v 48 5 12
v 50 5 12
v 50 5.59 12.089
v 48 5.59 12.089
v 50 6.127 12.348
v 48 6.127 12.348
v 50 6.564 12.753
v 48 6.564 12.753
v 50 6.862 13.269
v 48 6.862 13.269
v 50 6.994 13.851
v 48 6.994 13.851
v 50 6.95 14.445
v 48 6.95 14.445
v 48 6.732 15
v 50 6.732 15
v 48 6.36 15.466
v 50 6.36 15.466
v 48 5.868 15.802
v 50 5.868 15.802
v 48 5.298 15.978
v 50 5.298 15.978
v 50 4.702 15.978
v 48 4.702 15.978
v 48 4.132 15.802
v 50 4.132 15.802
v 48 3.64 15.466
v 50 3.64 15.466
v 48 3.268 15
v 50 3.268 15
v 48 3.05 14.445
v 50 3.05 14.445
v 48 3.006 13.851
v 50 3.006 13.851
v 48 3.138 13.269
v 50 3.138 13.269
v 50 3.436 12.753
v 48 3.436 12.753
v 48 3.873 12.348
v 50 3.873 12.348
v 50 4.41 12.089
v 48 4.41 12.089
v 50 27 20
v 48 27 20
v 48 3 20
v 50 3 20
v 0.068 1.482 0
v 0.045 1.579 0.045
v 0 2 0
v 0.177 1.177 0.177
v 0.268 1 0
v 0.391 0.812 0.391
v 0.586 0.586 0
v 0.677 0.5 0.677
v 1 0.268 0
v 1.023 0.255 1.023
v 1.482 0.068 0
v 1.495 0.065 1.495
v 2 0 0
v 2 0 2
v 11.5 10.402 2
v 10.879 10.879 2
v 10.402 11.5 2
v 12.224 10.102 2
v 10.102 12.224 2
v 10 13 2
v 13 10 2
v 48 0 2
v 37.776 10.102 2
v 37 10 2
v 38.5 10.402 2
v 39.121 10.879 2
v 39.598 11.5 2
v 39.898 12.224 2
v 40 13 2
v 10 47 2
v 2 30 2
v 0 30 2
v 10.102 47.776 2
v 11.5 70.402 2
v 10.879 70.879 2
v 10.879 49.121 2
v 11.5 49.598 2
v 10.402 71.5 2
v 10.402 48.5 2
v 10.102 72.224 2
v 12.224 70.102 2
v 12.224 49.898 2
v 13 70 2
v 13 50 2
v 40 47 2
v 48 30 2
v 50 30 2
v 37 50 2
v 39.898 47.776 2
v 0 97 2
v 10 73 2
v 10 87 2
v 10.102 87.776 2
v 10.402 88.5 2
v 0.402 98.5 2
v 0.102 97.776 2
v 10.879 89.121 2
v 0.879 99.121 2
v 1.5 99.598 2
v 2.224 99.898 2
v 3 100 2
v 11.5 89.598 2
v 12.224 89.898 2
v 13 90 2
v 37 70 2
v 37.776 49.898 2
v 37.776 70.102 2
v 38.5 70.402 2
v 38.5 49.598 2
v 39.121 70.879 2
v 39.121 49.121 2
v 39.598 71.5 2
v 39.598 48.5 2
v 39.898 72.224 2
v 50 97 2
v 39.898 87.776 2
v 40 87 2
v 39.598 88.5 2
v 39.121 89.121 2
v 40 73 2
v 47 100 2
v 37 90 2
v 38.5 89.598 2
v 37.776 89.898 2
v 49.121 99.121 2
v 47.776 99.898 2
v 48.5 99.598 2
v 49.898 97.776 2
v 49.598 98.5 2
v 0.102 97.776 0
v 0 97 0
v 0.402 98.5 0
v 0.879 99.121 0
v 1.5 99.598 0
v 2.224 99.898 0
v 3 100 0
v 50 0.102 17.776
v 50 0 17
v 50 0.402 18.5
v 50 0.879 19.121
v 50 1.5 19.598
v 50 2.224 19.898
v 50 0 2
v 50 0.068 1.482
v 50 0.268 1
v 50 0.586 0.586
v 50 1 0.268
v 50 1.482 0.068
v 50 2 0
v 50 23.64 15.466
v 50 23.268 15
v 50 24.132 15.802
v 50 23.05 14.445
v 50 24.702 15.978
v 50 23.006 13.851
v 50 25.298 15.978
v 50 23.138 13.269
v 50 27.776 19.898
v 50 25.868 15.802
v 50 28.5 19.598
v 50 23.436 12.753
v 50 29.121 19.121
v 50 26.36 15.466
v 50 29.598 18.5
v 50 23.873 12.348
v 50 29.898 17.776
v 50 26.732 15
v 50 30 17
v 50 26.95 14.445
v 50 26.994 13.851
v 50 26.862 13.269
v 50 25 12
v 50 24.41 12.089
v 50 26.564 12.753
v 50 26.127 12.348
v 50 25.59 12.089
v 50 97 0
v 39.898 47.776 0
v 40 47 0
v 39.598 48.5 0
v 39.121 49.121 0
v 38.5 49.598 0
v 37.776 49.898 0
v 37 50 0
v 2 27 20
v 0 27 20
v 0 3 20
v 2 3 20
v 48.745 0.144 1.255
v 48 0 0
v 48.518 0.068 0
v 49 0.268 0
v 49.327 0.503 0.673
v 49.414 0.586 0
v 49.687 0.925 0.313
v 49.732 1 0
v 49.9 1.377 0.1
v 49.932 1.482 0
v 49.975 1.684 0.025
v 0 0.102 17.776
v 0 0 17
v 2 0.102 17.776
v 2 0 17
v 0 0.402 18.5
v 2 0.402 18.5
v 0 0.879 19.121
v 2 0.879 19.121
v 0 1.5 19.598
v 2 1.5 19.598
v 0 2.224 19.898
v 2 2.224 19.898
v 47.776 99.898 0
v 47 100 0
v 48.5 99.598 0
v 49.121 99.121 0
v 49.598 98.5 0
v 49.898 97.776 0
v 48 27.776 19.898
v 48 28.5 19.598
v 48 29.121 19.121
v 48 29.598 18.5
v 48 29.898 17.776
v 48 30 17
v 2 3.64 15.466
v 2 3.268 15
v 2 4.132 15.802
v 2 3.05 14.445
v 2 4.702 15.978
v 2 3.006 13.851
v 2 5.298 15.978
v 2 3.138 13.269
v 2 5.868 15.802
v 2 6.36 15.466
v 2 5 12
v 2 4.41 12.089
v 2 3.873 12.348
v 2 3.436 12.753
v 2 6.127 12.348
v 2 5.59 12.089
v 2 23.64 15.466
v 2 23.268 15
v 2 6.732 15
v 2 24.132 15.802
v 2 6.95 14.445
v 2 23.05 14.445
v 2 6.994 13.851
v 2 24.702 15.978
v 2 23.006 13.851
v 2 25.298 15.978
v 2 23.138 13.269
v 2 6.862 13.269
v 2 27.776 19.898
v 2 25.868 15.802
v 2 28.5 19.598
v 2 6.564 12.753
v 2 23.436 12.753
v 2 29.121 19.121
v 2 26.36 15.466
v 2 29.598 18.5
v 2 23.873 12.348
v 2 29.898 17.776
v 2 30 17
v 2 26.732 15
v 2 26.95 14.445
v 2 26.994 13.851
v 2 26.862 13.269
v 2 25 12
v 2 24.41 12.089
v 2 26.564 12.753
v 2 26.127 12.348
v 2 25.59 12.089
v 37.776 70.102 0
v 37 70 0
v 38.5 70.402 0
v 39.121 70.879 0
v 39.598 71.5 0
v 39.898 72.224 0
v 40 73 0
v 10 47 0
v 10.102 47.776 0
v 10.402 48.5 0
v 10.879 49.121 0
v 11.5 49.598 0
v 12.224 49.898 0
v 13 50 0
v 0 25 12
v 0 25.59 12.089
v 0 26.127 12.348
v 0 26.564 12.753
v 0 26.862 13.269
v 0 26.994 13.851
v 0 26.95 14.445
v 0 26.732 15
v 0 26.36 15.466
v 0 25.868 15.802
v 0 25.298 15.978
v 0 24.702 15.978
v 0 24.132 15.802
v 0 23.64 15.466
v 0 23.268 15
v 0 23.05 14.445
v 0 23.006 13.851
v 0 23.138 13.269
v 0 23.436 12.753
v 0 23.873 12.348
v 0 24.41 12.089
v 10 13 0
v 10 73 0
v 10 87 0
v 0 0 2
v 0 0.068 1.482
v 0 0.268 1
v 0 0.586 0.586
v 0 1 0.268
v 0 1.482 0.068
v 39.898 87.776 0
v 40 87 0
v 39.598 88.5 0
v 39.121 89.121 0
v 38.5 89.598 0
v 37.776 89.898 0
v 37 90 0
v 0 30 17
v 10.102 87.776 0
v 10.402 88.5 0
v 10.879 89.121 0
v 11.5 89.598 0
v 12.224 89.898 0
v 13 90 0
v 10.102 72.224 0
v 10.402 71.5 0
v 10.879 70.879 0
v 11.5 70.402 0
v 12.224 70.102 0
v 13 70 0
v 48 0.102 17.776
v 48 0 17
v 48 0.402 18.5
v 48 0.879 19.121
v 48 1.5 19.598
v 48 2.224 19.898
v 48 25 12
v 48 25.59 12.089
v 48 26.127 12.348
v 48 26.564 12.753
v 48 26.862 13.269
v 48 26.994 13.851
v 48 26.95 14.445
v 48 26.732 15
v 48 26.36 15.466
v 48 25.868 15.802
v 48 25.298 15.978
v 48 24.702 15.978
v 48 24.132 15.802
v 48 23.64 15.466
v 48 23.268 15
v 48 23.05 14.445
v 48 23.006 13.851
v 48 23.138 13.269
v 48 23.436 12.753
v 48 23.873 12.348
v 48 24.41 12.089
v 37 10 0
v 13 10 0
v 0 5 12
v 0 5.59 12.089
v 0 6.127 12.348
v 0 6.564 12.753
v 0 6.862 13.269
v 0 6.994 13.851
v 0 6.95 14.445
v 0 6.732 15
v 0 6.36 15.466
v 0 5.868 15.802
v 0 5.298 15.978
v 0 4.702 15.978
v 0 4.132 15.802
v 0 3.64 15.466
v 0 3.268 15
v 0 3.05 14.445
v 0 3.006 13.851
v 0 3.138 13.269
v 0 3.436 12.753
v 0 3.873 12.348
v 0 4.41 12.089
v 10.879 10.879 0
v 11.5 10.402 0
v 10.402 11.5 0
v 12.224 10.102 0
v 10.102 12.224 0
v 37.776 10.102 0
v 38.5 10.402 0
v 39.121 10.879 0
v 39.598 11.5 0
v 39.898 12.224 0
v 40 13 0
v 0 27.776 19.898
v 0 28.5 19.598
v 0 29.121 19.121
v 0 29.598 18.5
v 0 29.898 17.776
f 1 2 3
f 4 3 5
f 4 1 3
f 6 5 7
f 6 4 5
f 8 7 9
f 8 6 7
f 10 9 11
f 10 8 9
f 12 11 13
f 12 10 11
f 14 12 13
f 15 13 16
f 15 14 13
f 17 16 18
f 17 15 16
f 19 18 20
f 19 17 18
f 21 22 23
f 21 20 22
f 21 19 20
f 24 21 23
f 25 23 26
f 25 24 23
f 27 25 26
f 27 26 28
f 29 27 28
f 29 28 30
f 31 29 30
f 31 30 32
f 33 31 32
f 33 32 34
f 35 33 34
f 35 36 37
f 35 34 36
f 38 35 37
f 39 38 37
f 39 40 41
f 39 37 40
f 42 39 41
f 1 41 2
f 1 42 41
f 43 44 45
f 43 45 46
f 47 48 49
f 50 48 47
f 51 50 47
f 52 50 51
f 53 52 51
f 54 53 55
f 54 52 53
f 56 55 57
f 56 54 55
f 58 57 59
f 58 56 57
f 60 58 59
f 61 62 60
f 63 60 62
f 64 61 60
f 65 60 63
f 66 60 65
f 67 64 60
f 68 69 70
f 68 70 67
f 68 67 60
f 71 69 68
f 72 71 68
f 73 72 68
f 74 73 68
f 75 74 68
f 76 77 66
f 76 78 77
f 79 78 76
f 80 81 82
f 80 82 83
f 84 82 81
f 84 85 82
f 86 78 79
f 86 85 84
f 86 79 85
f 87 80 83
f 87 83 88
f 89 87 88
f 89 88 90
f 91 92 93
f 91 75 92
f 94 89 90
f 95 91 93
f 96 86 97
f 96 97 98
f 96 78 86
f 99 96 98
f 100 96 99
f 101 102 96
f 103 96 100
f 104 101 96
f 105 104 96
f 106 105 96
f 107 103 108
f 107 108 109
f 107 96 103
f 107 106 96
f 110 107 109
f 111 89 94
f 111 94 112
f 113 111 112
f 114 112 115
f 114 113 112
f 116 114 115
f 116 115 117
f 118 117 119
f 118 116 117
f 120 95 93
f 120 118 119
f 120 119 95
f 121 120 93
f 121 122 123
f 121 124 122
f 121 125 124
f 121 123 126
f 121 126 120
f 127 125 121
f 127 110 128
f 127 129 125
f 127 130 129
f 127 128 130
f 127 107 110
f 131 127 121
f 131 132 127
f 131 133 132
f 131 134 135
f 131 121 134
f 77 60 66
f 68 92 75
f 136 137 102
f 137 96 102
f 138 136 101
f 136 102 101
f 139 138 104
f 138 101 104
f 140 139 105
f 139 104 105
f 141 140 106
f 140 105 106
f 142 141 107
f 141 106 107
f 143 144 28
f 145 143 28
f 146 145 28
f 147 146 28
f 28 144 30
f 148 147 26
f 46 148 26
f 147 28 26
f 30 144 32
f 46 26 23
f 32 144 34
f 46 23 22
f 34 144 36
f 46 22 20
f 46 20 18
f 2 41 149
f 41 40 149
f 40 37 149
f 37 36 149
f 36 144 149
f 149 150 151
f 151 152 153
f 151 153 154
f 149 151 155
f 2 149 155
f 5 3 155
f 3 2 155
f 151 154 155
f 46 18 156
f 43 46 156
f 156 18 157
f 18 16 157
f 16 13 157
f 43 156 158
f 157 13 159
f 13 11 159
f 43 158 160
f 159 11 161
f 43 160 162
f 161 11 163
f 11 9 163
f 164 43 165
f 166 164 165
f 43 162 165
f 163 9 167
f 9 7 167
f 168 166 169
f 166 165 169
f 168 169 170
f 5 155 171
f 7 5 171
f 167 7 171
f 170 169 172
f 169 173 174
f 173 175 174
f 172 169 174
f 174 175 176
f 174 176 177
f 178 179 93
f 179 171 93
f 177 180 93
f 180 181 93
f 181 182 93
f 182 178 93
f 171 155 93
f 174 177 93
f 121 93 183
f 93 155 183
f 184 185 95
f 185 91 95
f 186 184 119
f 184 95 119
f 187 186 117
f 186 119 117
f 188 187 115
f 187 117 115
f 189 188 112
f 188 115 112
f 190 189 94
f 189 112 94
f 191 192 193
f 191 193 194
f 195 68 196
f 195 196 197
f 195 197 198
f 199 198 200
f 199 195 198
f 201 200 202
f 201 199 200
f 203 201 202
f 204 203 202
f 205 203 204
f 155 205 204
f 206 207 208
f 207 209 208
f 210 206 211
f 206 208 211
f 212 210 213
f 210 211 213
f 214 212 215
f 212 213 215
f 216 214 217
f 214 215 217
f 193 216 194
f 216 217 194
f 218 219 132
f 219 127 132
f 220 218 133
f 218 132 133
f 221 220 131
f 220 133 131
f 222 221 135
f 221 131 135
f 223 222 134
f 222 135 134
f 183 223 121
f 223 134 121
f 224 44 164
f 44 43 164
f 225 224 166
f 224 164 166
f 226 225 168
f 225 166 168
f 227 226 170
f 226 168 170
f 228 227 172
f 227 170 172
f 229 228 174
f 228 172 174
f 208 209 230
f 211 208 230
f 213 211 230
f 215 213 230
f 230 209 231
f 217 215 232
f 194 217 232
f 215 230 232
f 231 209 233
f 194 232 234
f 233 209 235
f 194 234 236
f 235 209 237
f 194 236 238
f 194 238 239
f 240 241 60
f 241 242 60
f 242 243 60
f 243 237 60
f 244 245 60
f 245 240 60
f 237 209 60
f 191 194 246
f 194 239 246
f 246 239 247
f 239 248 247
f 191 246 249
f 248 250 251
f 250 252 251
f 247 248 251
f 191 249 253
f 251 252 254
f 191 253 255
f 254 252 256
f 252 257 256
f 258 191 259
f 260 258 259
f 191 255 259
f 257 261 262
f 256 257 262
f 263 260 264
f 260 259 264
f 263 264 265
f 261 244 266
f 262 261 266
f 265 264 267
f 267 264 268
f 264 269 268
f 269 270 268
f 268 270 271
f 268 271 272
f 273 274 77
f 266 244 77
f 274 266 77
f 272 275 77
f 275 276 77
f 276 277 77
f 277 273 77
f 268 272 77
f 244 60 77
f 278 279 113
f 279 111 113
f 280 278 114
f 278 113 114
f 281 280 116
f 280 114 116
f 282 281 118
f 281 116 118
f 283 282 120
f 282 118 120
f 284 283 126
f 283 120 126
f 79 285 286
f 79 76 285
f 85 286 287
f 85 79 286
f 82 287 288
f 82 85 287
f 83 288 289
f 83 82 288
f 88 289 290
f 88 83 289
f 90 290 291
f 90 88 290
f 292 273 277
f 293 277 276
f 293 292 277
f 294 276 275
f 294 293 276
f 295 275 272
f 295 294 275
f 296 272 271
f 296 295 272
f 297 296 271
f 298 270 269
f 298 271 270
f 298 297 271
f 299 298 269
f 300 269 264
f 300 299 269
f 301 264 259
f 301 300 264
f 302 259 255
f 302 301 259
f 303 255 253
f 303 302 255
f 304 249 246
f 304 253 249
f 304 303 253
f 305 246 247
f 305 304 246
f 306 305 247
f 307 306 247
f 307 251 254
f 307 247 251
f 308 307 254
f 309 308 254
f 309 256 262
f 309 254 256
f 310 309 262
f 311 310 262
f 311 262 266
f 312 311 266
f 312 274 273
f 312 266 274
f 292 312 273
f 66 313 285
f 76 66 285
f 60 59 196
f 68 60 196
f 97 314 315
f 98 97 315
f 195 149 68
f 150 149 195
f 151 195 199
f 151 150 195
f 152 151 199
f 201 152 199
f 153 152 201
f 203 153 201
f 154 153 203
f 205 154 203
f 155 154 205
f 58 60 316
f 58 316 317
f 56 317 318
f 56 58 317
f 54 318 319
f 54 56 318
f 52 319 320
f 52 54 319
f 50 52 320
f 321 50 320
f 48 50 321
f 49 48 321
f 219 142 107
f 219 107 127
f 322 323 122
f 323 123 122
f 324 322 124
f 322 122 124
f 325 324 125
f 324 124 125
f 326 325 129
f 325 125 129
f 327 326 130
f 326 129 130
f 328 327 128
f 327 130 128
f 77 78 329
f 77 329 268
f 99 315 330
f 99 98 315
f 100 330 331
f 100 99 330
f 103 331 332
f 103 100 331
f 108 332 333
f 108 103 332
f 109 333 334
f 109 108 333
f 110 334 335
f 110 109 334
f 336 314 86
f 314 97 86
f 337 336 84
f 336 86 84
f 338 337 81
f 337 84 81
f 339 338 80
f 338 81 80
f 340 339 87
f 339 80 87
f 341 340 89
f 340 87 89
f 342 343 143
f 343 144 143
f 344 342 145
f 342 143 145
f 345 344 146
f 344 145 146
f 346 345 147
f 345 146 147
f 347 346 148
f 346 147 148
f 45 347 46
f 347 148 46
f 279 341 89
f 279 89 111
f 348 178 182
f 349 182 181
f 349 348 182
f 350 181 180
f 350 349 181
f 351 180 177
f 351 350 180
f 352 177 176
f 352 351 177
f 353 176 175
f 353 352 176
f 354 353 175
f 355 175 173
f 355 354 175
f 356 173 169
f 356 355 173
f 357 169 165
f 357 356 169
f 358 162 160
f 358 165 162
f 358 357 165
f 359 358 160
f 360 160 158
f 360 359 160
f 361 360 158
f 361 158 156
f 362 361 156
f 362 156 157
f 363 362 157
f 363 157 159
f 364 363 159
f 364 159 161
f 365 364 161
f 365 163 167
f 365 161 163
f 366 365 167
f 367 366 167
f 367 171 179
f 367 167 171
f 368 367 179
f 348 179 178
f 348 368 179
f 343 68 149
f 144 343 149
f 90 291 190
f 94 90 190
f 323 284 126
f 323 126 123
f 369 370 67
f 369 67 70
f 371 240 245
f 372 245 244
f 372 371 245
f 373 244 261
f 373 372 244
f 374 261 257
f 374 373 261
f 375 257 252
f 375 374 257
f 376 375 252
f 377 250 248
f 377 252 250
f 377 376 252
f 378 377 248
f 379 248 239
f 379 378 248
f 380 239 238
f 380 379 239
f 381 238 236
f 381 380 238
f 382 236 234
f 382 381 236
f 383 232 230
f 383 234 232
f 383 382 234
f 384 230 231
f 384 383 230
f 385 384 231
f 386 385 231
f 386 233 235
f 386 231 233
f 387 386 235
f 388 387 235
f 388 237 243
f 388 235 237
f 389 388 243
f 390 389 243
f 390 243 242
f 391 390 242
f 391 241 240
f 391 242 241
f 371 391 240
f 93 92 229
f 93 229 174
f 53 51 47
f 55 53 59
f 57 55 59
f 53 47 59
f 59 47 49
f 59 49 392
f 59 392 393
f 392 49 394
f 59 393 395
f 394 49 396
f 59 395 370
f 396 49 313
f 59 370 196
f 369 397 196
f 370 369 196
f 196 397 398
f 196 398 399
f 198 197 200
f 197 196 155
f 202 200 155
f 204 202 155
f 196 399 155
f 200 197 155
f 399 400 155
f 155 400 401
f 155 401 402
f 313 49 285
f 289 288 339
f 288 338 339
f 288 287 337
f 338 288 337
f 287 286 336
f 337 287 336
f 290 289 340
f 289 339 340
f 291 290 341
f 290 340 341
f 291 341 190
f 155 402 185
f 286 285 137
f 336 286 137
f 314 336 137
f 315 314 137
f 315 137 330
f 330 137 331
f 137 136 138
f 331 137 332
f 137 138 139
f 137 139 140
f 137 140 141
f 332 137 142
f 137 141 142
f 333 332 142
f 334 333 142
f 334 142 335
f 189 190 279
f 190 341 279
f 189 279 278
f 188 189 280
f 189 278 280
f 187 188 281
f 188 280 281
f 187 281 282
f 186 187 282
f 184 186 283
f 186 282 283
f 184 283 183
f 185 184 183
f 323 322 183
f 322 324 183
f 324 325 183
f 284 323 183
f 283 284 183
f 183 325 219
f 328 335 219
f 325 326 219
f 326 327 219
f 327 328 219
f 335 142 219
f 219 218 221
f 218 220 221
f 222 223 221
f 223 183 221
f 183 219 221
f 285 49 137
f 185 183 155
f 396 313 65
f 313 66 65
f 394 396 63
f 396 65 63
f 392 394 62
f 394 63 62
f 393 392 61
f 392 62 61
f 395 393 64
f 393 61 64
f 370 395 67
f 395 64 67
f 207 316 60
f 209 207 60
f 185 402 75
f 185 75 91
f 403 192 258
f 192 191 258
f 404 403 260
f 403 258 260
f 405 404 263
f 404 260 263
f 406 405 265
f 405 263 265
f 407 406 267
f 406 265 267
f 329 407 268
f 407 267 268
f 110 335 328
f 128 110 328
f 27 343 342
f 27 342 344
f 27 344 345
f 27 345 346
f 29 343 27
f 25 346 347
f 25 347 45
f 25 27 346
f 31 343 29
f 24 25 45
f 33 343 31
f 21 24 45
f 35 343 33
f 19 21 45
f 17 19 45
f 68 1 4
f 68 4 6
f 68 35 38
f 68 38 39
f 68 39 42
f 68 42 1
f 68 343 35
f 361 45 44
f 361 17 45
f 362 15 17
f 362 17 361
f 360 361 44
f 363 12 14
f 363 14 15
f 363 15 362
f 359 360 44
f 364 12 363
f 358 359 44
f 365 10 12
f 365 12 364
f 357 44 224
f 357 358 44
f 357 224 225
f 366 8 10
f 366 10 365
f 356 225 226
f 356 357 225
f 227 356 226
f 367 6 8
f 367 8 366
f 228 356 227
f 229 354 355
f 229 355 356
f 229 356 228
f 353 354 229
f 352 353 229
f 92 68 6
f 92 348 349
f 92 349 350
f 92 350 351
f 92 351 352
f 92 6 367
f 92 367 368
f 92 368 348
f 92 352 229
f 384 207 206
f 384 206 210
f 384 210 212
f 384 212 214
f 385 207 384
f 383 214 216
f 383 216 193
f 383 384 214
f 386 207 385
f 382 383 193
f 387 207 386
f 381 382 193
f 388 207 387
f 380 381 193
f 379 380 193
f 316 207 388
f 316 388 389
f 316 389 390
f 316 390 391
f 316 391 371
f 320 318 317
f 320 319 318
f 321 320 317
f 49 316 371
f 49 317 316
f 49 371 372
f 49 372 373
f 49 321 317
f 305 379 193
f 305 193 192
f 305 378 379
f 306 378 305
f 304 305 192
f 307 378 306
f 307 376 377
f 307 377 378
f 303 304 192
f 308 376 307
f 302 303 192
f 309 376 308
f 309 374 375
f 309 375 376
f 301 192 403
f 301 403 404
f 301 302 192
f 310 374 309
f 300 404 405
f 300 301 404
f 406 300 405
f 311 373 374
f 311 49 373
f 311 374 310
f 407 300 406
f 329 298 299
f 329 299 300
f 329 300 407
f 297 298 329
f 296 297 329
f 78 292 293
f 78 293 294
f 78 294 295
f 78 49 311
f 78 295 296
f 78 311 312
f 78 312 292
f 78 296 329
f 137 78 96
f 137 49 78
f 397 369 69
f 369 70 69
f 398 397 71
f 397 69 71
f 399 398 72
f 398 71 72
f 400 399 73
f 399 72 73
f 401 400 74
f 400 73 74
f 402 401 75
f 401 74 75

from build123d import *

# Parameters (mm, degrees)
CYLINDER003_R     = 2
CYLINDER003_DEPTH = 10
CYLINDER002_R     = 2
CYLINDER002_DEPTH = 10
BOX007_W          = 2
BOX007_H          = 30
BOX007_DEPTH      = 20
FILLET009_R       = 2
FILLET010_R       = 3
BOX006_W          = 30
BOX006_H          = 20
BOX006_DEPTH      = 2
FILLET008_R       = 3
BOX005_W          = 30
BOX005_H          = 40
BOX005_DEPTH      = 2
FILLET007_R       = 3
BOX004_W          = 50
BOX004_H          = 100
BOX004_DEPTH      = 2
FILLET005_R       = 2
FILLET006_R       = 3
CYLINDER005_R     = 2
CYLINDER005_DEPTH = 10
CYLINDER004_R     = 2
CYLINDER004_DEPTH = 10
BOX008_W          = 2
BOX008_H          = 30
BOX008_DEPTH      = 20
FILLET011_R       = 2
FILLET012_R       = 3


with BuildPart() as cylinder003:
    # Cylinder003 → Cylinder003 (new body)
    with BuildSketch(Plane(origin=(0, 25, 14), x_dir=(0, 0, -1), z_dir=(1, 0, 0))):
        Circle(CYLINDER003_R)
    extrude(amount=CYLINDER003_DEPTH)


with BuildPart() as cylinder002:
    # Cylinder002 → Cylinder002 (new body)
    with BuildSketch(Plane(origin=(0, 5, 14), x_dir=(0, 0, -1), z_dir=(1, 0, 0))):
        Circle(CYLINDER002_R)
    extrude(amount=CYLINDER002_DEPTH)


with BuildPart() as mini_pe_a:
    # Box007 → Box007 (new body)
    with BuildSketch(Plane.XY):
        with Locations((1, 15)):
            Rectangle(BOX007_W, BOX007_H)
    extrude(amount=BOX007_DEPTH)

    # Fillet009
    fillet009_edges = [mini_pe_a.edges().sort_by_distance(p)[0] for p in [
        (1, 0, 0),
        (1, 30, 0),
    ]]
    fillet(fillet009_edges, radius=FILLET009_R)

    # Fillet010
    fillet010_edges = [mini_pe_a.edges().sort_by_distance(p)[0] for p in [
        (1, 0, 20),
        (1, 30, 20),
    ]]
    fillet(fillet010_edges, radius=FILLET010_R)

    # Cut006: cut Cylinder002
    add(cylinder002.part, mode=Mode.SUBTRACT)

    # Cut007: cut Cylinder003
    add(cylinder003.part, mode=Mode.SUBTRACT)


with BuildPart() as forat2:
    # Box006 → Box006 (new body)
    with BuildSketch(Plane.XY):
        with Locations((15, 10)):
            Rectangle(BOX006_W, BOX006_H)
    extrude(amount=BOX006_DEPTH)

    # Fillet008
    fillet008_edges = [forat2.edges().sort_by_distance(p)[0] for p in [
        (0, 0, 1),
        (0, 20, 1),
        (30, 0, 1),
        (30, 20, 1),
    ]]
    fillet(fillet008_edges, radius=FILLET008_R)


with BuildPart() as forat2_1:
    # Fillet008 placement: moved
    add(forat2.part.moved(Location((10, 70, 0))))


with BuildPart() as forat1:
    # Box005 → Box005 (new body)
    with BuildSketch(Plane.XY):
        with Locations((15, 20)):
            Rectangle(BOX005_W, BOX005_H)
    extrude(amount=BOX005_DEPTH)

    # Fillet007
    fillet007_edges = [forat1.edges().sort_by_distance(p)[0] for p in [
        (0, 0, 1),
        (0, 40, 1),
        (30, 0, 1),
        (30, 40, 1),
    ]]
    fillet(fillet007_edges, radius=FILLET007_R)


with BuildPart() as forat1_1:
    # Fillet007 placement: moved
    add(forat1.part.moved(Location((10, 10, 0))))


with BuildPart() as fusion:
    # Box004 → Box004 (new body)
    with BuildSketch(Plane.XY):
        with Locations((25, 50)):
            Rectangle(BOX004_W, BOX004_H)
    extrude(amount=BOX004_DEPTH)

    # Fillet005
    fillet005_edges = [fusion.edges().sort_by_distance(p)[0] for p in [
        (0, 0, 1),
        (50, 0, 1),
    ]]
    fillet(fillet005_edges, radius=FILLET005_R)

    # Fillet006
    fillet006_edges = [fusion.edges().sort_by_distance(p)[0] for p in [
        (0, 100, 1),
        (50, 100, 1),
    ]]
    fillet(fillet006_edges, radius=FILLET006_R)

    # Cut004: cut forat1
    add(forat1_1.part, mode=Mode.SUBTRACT)

    # Cut005: cut forat2
    add(forat2_1.part, mode=Mode.SUBTRACT)

    # Fusion: union mini_peça
    add(mini_pe_a.part)


with BuildPart() as cylinder005:
    # Cylinder005 → Cylinder005 (new body)
    with BuildSketch(Plane(origin=(0, 25, 14), x_dir=(0, 0, -1), z_dir=(1, 0, 0))):
        Circle(CYLINDER005_R)
    extrude(amount=CYLINDER005_DEPTH)


with BuildPart() as cylinder004:
    # Cylinder004 → Cylinder004 (new body)
    with BuildSketch(Plane(origin=(0, 5, 14), x_dir=(0, 0, -1), z_dir=(1, 0, 0))):
        Circle(CYLINDER004_R)
    extrude(amount=CYLINDER004_DEPTH)


with BuildPart() as pe_a:
    # Box008 → Box008 (new body)
    with BuildSketch(Plane.XY):
        with Locations((1, 15)):
            Rectangle(BOX008_W, BOX008_H)
    extrude(amount=BOX008_DEPTH)

    # Fillet011
    fillet011_edges = [pe_a.edges().sort_by_distance(p)[0] for p in [
        (1, 0, 0),
        (1, 30, 0),
    ]]
    fillet(fillet011_edges, radius=FILLET011_R)

    # Fillet012
    fillet012_edges = [pe_a.edges().sort_by_distance(p)[0] for p in [
        (1, 0, 20),
        (1, 30, 20),
    ]]
    fillet(fillet012_edges, radius=FILLET012_R)

    # Cut008: cut Cylinder004
    add(cylinder004.part, mode=Mode.SUBTRACT)

    # Cut009: cut Cylinder005
    add(cylinder005.part, mode=Mode.SUBTRACT)


with BuildPart() as pe_a_1:
    # Cut009 placement: moved
    add(pe_a.part.moved(Location((48, 0, 0))))

    # Fusion001: union Fusion
    add(fusion.part)


solid = pe_a_1.part
